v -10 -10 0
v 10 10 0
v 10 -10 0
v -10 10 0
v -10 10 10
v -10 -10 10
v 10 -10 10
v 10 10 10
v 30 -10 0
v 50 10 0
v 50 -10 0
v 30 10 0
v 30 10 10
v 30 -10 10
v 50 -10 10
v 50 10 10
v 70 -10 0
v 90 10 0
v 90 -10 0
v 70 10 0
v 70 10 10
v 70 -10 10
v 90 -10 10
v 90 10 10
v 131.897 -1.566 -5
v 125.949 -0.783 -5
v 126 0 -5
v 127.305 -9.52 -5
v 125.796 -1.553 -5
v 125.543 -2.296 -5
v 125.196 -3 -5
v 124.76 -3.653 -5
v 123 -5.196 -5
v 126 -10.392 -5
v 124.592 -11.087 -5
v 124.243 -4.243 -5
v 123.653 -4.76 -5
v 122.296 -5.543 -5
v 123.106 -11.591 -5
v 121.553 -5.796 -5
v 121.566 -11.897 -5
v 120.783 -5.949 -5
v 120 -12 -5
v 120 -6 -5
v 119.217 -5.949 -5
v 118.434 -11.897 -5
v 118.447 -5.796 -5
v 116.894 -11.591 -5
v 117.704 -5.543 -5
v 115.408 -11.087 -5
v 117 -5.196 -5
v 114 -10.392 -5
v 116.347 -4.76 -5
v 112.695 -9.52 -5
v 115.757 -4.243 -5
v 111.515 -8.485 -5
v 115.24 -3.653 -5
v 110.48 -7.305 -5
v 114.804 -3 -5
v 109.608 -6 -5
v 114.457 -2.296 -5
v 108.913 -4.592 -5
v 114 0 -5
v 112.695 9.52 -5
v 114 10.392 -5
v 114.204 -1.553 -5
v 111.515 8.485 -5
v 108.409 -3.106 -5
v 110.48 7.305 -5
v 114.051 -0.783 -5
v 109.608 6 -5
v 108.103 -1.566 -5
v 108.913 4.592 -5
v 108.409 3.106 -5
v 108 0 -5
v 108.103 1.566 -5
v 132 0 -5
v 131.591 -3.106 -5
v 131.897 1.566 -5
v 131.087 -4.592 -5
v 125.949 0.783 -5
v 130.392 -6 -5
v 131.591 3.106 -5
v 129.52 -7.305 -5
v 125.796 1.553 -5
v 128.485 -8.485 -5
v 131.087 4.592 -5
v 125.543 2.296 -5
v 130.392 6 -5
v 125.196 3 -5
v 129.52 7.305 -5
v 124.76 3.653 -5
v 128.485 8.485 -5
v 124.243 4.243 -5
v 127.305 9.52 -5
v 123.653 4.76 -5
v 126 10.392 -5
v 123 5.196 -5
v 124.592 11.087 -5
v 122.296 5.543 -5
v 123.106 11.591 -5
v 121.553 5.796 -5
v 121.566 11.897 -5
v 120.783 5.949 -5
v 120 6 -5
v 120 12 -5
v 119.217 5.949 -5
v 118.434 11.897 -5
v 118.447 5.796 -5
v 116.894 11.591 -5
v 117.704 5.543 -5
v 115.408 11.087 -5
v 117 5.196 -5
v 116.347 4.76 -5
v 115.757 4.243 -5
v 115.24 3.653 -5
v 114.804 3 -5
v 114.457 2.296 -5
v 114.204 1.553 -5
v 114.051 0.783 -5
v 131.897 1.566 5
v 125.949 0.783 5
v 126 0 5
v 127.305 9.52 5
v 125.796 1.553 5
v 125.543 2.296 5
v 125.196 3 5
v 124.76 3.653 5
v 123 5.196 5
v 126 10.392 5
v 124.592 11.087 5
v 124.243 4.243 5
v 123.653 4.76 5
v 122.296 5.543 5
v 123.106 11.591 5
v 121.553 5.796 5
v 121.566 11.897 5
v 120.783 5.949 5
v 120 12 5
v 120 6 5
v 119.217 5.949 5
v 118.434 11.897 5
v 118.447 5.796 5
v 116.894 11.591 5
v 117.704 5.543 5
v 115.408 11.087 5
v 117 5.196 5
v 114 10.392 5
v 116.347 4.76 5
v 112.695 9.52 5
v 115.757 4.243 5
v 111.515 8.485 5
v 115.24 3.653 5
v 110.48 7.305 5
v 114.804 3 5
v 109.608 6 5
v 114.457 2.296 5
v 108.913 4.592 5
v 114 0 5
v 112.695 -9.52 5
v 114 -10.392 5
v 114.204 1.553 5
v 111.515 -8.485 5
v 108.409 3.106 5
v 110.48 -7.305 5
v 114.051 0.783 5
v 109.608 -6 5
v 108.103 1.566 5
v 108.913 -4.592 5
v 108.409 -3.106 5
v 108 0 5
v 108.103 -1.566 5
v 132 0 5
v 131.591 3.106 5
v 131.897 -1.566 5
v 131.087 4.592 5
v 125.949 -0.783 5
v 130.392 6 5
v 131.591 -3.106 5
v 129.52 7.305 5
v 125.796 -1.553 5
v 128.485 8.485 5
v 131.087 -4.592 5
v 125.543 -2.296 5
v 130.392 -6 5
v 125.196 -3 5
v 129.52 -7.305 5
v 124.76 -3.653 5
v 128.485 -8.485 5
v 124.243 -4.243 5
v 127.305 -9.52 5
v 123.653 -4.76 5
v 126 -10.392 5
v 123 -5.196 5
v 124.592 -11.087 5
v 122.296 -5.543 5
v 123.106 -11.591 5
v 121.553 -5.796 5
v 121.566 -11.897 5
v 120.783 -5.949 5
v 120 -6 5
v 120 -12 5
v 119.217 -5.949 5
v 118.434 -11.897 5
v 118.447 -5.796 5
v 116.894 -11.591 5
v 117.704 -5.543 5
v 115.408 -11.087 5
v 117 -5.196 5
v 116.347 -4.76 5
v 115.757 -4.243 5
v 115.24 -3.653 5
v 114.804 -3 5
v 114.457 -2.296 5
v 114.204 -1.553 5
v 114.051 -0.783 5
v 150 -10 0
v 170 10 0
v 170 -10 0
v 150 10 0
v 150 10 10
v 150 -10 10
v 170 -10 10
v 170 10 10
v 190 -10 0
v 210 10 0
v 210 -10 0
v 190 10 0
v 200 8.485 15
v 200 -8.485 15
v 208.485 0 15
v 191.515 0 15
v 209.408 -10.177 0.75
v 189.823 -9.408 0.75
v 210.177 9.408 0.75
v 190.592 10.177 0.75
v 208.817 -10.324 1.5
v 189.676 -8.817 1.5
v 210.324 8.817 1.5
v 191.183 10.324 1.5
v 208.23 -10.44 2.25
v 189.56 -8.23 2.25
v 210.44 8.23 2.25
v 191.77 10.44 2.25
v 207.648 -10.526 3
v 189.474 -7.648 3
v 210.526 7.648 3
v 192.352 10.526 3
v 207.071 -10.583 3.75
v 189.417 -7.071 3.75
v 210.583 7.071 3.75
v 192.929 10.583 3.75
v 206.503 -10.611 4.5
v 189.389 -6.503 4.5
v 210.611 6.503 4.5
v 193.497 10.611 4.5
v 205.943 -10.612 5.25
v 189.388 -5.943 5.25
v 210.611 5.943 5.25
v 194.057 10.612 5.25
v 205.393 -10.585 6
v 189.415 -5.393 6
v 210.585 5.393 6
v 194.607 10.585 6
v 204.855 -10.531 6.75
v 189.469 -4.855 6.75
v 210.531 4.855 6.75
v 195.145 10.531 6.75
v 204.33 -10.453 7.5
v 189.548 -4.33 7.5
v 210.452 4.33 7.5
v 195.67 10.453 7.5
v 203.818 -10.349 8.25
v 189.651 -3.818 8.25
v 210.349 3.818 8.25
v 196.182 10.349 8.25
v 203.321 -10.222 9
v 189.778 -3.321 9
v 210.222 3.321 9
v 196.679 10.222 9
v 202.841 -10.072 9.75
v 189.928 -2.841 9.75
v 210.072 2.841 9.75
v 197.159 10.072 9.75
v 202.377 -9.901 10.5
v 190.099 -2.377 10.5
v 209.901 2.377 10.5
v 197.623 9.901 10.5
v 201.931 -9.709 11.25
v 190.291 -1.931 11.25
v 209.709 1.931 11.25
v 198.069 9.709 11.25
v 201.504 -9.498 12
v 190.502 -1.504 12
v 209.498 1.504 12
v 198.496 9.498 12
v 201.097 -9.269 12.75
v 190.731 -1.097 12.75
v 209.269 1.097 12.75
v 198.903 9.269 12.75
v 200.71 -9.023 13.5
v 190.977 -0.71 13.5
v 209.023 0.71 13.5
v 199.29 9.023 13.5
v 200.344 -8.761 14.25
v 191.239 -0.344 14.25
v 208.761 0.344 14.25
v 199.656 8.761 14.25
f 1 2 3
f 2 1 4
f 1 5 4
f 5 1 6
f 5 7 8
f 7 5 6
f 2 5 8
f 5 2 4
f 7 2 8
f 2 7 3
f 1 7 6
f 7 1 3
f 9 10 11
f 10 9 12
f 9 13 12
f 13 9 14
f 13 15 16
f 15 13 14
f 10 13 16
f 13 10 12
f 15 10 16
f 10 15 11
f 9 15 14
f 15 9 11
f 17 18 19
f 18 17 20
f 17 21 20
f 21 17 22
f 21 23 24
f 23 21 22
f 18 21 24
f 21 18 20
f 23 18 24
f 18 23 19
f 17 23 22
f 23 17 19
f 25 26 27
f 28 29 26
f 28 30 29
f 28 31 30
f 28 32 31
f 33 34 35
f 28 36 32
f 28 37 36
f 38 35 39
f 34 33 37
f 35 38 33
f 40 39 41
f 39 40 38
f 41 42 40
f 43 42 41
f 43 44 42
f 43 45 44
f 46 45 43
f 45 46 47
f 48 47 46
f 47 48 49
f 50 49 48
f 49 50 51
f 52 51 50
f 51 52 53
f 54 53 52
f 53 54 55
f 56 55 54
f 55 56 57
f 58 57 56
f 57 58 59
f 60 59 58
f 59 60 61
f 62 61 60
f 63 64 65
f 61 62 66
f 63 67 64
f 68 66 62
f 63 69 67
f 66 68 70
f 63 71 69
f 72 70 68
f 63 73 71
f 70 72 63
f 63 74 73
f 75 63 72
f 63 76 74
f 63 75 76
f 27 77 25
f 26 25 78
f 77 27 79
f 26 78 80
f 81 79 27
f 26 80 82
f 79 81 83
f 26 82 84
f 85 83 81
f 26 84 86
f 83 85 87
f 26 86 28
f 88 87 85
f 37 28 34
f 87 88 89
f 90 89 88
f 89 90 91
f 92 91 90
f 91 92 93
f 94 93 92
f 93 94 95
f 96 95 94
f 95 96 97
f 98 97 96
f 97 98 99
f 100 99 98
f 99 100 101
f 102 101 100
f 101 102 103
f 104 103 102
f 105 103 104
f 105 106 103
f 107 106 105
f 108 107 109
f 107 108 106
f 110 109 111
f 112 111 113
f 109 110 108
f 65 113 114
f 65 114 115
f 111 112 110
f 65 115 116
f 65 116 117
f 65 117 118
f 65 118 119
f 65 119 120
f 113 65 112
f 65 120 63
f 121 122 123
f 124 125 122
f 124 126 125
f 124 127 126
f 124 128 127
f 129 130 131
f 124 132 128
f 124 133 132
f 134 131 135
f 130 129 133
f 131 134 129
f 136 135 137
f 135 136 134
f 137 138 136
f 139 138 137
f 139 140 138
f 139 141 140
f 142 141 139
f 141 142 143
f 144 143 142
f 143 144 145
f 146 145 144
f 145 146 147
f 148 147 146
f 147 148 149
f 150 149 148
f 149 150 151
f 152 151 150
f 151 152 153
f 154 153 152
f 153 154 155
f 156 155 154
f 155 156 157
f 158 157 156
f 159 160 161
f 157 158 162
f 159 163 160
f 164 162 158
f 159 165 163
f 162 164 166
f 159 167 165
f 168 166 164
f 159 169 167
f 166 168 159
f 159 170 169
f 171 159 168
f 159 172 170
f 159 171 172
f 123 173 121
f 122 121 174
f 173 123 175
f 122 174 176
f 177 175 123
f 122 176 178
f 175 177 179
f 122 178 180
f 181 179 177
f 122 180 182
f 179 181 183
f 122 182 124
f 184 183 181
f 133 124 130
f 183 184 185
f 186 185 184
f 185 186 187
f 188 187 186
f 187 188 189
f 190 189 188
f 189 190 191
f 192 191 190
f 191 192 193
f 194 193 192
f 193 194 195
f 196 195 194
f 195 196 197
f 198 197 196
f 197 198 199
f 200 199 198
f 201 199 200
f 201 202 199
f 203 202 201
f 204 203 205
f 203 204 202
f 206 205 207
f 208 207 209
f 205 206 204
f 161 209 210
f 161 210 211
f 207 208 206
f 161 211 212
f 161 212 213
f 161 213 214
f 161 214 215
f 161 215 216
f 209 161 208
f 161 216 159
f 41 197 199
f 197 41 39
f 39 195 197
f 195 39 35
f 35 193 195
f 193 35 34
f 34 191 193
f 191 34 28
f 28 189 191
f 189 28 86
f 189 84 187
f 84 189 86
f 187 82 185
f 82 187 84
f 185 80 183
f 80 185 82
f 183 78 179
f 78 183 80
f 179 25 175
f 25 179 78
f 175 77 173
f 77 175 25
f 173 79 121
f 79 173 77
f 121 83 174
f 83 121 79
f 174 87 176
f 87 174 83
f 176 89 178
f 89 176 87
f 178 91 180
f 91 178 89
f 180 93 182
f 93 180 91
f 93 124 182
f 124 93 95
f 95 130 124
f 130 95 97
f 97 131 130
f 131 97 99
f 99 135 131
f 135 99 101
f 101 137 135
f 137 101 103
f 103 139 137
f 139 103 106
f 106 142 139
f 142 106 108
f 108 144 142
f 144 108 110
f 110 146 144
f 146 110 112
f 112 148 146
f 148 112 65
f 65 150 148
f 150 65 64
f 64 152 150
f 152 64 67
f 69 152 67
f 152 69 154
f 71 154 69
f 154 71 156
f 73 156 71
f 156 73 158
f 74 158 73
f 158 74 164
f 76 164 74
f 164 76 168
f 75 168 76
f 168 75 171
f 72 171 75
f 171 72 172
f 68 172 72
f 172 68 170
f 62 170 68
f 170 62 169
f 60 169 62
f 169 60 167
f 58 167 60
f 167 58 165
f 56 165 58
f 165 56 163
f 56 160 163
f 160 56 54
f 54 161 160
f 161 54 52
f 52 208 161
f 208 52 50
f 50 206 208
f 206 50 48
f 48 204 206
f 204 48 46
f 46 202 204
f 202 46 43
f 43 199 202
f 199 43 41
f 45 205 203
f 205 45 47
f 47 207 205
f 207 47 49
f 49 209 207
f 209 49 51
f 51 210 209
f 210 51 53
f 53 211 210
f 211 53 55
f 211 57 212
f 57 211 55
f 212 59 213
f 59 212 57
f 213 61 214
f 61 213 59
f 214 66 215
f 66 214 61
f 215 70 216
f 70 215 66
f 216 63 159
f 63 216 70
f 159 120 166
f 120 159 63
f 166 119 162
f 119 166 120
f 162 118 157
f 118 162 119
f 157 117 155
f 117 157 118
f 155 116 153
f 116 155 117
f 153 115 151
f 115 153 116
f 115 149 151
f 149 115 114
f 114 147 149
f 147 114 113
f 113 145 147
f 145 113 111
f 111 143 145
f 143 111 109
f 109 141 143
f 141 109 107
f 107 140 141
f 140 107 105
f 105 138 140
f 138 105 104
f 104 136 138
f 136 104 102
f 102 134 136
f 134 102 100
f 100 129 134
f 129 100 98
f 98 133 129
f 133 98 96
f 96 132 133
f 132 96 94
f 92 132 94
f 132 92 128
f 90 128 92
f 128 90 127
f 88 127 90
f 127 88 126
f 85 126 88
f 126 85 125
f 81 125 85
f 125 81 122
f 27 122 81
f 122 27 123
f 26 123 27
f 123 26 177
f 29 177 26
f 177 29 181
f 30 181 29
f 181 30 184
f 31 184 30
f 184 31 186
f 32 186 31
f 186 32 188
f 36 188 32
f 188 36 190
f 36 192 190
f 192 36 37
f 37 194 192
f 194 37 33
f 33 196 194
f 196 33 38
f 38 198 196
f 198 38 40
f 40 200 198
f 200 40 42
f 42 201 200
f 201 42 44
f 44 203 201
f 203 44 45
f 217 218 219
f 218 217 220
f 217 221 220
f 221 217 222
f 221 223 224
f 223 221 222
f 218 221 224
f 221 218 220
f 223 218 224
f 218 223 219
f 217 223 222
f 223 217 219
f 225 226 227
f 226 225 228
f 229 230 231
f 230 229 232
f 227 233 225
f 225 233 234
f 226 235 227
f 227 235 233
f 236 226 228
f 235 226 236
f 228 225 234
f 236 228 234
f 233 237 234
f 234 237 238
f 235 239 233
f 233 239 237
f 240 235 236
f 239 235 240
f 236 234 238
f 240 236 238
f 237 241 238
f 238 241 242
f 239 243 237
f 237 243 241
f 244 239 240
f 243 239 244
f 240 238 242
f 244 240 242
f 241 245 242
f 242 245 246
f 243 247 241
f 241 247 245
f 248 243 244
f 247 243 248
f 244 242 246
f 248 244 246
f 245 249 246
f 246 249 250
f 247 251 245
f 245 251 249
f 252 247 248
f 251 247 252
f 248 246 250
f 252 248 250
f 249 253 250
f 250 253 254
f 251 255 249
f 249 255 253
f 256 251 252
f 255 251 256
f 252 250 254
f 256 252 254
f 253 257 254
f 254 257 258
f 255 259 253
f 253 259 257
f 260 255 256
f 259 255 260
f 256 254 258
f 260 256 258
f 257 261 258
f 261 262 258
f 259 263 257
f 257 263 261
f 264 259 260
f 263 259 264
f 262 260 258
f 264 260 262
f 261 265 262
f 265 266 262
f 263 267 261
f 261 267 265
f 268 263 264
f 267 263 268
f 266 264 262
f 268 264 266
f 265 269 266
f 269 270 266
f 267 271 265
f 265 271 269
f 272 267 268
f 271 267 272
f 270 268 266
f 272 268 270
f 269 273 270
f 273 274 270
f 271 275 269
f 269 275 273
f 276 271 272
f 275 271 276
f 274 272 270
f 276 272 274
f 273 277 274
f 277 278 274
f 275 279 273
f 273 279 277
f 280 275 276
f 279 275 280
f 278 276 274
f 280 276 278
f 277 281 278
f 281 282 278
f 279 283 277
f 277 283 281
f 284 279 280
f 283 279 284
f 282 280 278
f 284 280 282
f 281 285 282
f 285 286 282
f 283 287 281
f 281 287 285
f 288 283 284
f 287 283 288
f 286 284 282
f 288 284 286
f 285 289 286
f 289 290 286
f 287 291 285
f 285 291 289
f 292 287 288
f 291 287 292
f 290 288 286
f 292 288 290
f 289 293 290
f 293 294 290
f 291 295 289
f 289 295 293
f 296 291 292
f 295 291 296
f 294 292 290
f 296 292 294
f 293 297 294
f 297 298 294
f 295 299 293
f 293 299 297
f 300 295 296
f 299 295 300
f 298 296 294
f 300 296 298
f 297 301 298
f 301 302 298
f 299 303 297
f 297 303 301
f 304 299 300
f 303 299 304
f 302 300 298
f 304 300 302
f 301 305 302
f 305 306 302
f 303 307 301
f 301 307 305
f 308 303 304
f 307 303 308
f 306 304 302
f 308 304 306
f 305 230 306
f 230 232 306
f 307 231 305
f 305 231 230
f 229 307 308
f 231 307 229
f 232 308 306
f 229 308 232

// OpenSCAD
// Experimental linear_extrude chamfer/draft tests.
// Requires --enable=linear-extrude-chamfer

// Chamfer both rims of a square.
translate([0, 0, 0])
  linear_extrude(height = 10, chamfer = 2) square(20, center = true);

// Chamfer only the top rim.
translate([40, 0, 0])
  linear_extrude(height = 10, chamfer = 2, chamfer_bottom = false) square(20, center = true);

// Chamfer only the bottom rim.
translate([80, 0, 0])
  linear_extrude(height = 10, chamfer = 2, chamfer_top = false) square(20, center = true);

// Chamfer with a hole (ring), centered.
translate([120, 0, 0])
  linear_extrude(height = 10, chamfer = 1.5, center = true)
    difference() { circle(r = 12, $fn = 48); circle(r = 6, $fn = 48); }

// Draft angle only (tapered sidewall, no chamfer).
translate([160, 0, 0])
  linear_extrude(height = 10, draft = 5) square(20, center = true);

// Chamfer combined with scale + twist.
translate([200, 0, 0])
  linear_extrude(height = 15, chamfer = 2, scale = 0.6, twist = 45, slices = 20)
    square(20, center = true);
